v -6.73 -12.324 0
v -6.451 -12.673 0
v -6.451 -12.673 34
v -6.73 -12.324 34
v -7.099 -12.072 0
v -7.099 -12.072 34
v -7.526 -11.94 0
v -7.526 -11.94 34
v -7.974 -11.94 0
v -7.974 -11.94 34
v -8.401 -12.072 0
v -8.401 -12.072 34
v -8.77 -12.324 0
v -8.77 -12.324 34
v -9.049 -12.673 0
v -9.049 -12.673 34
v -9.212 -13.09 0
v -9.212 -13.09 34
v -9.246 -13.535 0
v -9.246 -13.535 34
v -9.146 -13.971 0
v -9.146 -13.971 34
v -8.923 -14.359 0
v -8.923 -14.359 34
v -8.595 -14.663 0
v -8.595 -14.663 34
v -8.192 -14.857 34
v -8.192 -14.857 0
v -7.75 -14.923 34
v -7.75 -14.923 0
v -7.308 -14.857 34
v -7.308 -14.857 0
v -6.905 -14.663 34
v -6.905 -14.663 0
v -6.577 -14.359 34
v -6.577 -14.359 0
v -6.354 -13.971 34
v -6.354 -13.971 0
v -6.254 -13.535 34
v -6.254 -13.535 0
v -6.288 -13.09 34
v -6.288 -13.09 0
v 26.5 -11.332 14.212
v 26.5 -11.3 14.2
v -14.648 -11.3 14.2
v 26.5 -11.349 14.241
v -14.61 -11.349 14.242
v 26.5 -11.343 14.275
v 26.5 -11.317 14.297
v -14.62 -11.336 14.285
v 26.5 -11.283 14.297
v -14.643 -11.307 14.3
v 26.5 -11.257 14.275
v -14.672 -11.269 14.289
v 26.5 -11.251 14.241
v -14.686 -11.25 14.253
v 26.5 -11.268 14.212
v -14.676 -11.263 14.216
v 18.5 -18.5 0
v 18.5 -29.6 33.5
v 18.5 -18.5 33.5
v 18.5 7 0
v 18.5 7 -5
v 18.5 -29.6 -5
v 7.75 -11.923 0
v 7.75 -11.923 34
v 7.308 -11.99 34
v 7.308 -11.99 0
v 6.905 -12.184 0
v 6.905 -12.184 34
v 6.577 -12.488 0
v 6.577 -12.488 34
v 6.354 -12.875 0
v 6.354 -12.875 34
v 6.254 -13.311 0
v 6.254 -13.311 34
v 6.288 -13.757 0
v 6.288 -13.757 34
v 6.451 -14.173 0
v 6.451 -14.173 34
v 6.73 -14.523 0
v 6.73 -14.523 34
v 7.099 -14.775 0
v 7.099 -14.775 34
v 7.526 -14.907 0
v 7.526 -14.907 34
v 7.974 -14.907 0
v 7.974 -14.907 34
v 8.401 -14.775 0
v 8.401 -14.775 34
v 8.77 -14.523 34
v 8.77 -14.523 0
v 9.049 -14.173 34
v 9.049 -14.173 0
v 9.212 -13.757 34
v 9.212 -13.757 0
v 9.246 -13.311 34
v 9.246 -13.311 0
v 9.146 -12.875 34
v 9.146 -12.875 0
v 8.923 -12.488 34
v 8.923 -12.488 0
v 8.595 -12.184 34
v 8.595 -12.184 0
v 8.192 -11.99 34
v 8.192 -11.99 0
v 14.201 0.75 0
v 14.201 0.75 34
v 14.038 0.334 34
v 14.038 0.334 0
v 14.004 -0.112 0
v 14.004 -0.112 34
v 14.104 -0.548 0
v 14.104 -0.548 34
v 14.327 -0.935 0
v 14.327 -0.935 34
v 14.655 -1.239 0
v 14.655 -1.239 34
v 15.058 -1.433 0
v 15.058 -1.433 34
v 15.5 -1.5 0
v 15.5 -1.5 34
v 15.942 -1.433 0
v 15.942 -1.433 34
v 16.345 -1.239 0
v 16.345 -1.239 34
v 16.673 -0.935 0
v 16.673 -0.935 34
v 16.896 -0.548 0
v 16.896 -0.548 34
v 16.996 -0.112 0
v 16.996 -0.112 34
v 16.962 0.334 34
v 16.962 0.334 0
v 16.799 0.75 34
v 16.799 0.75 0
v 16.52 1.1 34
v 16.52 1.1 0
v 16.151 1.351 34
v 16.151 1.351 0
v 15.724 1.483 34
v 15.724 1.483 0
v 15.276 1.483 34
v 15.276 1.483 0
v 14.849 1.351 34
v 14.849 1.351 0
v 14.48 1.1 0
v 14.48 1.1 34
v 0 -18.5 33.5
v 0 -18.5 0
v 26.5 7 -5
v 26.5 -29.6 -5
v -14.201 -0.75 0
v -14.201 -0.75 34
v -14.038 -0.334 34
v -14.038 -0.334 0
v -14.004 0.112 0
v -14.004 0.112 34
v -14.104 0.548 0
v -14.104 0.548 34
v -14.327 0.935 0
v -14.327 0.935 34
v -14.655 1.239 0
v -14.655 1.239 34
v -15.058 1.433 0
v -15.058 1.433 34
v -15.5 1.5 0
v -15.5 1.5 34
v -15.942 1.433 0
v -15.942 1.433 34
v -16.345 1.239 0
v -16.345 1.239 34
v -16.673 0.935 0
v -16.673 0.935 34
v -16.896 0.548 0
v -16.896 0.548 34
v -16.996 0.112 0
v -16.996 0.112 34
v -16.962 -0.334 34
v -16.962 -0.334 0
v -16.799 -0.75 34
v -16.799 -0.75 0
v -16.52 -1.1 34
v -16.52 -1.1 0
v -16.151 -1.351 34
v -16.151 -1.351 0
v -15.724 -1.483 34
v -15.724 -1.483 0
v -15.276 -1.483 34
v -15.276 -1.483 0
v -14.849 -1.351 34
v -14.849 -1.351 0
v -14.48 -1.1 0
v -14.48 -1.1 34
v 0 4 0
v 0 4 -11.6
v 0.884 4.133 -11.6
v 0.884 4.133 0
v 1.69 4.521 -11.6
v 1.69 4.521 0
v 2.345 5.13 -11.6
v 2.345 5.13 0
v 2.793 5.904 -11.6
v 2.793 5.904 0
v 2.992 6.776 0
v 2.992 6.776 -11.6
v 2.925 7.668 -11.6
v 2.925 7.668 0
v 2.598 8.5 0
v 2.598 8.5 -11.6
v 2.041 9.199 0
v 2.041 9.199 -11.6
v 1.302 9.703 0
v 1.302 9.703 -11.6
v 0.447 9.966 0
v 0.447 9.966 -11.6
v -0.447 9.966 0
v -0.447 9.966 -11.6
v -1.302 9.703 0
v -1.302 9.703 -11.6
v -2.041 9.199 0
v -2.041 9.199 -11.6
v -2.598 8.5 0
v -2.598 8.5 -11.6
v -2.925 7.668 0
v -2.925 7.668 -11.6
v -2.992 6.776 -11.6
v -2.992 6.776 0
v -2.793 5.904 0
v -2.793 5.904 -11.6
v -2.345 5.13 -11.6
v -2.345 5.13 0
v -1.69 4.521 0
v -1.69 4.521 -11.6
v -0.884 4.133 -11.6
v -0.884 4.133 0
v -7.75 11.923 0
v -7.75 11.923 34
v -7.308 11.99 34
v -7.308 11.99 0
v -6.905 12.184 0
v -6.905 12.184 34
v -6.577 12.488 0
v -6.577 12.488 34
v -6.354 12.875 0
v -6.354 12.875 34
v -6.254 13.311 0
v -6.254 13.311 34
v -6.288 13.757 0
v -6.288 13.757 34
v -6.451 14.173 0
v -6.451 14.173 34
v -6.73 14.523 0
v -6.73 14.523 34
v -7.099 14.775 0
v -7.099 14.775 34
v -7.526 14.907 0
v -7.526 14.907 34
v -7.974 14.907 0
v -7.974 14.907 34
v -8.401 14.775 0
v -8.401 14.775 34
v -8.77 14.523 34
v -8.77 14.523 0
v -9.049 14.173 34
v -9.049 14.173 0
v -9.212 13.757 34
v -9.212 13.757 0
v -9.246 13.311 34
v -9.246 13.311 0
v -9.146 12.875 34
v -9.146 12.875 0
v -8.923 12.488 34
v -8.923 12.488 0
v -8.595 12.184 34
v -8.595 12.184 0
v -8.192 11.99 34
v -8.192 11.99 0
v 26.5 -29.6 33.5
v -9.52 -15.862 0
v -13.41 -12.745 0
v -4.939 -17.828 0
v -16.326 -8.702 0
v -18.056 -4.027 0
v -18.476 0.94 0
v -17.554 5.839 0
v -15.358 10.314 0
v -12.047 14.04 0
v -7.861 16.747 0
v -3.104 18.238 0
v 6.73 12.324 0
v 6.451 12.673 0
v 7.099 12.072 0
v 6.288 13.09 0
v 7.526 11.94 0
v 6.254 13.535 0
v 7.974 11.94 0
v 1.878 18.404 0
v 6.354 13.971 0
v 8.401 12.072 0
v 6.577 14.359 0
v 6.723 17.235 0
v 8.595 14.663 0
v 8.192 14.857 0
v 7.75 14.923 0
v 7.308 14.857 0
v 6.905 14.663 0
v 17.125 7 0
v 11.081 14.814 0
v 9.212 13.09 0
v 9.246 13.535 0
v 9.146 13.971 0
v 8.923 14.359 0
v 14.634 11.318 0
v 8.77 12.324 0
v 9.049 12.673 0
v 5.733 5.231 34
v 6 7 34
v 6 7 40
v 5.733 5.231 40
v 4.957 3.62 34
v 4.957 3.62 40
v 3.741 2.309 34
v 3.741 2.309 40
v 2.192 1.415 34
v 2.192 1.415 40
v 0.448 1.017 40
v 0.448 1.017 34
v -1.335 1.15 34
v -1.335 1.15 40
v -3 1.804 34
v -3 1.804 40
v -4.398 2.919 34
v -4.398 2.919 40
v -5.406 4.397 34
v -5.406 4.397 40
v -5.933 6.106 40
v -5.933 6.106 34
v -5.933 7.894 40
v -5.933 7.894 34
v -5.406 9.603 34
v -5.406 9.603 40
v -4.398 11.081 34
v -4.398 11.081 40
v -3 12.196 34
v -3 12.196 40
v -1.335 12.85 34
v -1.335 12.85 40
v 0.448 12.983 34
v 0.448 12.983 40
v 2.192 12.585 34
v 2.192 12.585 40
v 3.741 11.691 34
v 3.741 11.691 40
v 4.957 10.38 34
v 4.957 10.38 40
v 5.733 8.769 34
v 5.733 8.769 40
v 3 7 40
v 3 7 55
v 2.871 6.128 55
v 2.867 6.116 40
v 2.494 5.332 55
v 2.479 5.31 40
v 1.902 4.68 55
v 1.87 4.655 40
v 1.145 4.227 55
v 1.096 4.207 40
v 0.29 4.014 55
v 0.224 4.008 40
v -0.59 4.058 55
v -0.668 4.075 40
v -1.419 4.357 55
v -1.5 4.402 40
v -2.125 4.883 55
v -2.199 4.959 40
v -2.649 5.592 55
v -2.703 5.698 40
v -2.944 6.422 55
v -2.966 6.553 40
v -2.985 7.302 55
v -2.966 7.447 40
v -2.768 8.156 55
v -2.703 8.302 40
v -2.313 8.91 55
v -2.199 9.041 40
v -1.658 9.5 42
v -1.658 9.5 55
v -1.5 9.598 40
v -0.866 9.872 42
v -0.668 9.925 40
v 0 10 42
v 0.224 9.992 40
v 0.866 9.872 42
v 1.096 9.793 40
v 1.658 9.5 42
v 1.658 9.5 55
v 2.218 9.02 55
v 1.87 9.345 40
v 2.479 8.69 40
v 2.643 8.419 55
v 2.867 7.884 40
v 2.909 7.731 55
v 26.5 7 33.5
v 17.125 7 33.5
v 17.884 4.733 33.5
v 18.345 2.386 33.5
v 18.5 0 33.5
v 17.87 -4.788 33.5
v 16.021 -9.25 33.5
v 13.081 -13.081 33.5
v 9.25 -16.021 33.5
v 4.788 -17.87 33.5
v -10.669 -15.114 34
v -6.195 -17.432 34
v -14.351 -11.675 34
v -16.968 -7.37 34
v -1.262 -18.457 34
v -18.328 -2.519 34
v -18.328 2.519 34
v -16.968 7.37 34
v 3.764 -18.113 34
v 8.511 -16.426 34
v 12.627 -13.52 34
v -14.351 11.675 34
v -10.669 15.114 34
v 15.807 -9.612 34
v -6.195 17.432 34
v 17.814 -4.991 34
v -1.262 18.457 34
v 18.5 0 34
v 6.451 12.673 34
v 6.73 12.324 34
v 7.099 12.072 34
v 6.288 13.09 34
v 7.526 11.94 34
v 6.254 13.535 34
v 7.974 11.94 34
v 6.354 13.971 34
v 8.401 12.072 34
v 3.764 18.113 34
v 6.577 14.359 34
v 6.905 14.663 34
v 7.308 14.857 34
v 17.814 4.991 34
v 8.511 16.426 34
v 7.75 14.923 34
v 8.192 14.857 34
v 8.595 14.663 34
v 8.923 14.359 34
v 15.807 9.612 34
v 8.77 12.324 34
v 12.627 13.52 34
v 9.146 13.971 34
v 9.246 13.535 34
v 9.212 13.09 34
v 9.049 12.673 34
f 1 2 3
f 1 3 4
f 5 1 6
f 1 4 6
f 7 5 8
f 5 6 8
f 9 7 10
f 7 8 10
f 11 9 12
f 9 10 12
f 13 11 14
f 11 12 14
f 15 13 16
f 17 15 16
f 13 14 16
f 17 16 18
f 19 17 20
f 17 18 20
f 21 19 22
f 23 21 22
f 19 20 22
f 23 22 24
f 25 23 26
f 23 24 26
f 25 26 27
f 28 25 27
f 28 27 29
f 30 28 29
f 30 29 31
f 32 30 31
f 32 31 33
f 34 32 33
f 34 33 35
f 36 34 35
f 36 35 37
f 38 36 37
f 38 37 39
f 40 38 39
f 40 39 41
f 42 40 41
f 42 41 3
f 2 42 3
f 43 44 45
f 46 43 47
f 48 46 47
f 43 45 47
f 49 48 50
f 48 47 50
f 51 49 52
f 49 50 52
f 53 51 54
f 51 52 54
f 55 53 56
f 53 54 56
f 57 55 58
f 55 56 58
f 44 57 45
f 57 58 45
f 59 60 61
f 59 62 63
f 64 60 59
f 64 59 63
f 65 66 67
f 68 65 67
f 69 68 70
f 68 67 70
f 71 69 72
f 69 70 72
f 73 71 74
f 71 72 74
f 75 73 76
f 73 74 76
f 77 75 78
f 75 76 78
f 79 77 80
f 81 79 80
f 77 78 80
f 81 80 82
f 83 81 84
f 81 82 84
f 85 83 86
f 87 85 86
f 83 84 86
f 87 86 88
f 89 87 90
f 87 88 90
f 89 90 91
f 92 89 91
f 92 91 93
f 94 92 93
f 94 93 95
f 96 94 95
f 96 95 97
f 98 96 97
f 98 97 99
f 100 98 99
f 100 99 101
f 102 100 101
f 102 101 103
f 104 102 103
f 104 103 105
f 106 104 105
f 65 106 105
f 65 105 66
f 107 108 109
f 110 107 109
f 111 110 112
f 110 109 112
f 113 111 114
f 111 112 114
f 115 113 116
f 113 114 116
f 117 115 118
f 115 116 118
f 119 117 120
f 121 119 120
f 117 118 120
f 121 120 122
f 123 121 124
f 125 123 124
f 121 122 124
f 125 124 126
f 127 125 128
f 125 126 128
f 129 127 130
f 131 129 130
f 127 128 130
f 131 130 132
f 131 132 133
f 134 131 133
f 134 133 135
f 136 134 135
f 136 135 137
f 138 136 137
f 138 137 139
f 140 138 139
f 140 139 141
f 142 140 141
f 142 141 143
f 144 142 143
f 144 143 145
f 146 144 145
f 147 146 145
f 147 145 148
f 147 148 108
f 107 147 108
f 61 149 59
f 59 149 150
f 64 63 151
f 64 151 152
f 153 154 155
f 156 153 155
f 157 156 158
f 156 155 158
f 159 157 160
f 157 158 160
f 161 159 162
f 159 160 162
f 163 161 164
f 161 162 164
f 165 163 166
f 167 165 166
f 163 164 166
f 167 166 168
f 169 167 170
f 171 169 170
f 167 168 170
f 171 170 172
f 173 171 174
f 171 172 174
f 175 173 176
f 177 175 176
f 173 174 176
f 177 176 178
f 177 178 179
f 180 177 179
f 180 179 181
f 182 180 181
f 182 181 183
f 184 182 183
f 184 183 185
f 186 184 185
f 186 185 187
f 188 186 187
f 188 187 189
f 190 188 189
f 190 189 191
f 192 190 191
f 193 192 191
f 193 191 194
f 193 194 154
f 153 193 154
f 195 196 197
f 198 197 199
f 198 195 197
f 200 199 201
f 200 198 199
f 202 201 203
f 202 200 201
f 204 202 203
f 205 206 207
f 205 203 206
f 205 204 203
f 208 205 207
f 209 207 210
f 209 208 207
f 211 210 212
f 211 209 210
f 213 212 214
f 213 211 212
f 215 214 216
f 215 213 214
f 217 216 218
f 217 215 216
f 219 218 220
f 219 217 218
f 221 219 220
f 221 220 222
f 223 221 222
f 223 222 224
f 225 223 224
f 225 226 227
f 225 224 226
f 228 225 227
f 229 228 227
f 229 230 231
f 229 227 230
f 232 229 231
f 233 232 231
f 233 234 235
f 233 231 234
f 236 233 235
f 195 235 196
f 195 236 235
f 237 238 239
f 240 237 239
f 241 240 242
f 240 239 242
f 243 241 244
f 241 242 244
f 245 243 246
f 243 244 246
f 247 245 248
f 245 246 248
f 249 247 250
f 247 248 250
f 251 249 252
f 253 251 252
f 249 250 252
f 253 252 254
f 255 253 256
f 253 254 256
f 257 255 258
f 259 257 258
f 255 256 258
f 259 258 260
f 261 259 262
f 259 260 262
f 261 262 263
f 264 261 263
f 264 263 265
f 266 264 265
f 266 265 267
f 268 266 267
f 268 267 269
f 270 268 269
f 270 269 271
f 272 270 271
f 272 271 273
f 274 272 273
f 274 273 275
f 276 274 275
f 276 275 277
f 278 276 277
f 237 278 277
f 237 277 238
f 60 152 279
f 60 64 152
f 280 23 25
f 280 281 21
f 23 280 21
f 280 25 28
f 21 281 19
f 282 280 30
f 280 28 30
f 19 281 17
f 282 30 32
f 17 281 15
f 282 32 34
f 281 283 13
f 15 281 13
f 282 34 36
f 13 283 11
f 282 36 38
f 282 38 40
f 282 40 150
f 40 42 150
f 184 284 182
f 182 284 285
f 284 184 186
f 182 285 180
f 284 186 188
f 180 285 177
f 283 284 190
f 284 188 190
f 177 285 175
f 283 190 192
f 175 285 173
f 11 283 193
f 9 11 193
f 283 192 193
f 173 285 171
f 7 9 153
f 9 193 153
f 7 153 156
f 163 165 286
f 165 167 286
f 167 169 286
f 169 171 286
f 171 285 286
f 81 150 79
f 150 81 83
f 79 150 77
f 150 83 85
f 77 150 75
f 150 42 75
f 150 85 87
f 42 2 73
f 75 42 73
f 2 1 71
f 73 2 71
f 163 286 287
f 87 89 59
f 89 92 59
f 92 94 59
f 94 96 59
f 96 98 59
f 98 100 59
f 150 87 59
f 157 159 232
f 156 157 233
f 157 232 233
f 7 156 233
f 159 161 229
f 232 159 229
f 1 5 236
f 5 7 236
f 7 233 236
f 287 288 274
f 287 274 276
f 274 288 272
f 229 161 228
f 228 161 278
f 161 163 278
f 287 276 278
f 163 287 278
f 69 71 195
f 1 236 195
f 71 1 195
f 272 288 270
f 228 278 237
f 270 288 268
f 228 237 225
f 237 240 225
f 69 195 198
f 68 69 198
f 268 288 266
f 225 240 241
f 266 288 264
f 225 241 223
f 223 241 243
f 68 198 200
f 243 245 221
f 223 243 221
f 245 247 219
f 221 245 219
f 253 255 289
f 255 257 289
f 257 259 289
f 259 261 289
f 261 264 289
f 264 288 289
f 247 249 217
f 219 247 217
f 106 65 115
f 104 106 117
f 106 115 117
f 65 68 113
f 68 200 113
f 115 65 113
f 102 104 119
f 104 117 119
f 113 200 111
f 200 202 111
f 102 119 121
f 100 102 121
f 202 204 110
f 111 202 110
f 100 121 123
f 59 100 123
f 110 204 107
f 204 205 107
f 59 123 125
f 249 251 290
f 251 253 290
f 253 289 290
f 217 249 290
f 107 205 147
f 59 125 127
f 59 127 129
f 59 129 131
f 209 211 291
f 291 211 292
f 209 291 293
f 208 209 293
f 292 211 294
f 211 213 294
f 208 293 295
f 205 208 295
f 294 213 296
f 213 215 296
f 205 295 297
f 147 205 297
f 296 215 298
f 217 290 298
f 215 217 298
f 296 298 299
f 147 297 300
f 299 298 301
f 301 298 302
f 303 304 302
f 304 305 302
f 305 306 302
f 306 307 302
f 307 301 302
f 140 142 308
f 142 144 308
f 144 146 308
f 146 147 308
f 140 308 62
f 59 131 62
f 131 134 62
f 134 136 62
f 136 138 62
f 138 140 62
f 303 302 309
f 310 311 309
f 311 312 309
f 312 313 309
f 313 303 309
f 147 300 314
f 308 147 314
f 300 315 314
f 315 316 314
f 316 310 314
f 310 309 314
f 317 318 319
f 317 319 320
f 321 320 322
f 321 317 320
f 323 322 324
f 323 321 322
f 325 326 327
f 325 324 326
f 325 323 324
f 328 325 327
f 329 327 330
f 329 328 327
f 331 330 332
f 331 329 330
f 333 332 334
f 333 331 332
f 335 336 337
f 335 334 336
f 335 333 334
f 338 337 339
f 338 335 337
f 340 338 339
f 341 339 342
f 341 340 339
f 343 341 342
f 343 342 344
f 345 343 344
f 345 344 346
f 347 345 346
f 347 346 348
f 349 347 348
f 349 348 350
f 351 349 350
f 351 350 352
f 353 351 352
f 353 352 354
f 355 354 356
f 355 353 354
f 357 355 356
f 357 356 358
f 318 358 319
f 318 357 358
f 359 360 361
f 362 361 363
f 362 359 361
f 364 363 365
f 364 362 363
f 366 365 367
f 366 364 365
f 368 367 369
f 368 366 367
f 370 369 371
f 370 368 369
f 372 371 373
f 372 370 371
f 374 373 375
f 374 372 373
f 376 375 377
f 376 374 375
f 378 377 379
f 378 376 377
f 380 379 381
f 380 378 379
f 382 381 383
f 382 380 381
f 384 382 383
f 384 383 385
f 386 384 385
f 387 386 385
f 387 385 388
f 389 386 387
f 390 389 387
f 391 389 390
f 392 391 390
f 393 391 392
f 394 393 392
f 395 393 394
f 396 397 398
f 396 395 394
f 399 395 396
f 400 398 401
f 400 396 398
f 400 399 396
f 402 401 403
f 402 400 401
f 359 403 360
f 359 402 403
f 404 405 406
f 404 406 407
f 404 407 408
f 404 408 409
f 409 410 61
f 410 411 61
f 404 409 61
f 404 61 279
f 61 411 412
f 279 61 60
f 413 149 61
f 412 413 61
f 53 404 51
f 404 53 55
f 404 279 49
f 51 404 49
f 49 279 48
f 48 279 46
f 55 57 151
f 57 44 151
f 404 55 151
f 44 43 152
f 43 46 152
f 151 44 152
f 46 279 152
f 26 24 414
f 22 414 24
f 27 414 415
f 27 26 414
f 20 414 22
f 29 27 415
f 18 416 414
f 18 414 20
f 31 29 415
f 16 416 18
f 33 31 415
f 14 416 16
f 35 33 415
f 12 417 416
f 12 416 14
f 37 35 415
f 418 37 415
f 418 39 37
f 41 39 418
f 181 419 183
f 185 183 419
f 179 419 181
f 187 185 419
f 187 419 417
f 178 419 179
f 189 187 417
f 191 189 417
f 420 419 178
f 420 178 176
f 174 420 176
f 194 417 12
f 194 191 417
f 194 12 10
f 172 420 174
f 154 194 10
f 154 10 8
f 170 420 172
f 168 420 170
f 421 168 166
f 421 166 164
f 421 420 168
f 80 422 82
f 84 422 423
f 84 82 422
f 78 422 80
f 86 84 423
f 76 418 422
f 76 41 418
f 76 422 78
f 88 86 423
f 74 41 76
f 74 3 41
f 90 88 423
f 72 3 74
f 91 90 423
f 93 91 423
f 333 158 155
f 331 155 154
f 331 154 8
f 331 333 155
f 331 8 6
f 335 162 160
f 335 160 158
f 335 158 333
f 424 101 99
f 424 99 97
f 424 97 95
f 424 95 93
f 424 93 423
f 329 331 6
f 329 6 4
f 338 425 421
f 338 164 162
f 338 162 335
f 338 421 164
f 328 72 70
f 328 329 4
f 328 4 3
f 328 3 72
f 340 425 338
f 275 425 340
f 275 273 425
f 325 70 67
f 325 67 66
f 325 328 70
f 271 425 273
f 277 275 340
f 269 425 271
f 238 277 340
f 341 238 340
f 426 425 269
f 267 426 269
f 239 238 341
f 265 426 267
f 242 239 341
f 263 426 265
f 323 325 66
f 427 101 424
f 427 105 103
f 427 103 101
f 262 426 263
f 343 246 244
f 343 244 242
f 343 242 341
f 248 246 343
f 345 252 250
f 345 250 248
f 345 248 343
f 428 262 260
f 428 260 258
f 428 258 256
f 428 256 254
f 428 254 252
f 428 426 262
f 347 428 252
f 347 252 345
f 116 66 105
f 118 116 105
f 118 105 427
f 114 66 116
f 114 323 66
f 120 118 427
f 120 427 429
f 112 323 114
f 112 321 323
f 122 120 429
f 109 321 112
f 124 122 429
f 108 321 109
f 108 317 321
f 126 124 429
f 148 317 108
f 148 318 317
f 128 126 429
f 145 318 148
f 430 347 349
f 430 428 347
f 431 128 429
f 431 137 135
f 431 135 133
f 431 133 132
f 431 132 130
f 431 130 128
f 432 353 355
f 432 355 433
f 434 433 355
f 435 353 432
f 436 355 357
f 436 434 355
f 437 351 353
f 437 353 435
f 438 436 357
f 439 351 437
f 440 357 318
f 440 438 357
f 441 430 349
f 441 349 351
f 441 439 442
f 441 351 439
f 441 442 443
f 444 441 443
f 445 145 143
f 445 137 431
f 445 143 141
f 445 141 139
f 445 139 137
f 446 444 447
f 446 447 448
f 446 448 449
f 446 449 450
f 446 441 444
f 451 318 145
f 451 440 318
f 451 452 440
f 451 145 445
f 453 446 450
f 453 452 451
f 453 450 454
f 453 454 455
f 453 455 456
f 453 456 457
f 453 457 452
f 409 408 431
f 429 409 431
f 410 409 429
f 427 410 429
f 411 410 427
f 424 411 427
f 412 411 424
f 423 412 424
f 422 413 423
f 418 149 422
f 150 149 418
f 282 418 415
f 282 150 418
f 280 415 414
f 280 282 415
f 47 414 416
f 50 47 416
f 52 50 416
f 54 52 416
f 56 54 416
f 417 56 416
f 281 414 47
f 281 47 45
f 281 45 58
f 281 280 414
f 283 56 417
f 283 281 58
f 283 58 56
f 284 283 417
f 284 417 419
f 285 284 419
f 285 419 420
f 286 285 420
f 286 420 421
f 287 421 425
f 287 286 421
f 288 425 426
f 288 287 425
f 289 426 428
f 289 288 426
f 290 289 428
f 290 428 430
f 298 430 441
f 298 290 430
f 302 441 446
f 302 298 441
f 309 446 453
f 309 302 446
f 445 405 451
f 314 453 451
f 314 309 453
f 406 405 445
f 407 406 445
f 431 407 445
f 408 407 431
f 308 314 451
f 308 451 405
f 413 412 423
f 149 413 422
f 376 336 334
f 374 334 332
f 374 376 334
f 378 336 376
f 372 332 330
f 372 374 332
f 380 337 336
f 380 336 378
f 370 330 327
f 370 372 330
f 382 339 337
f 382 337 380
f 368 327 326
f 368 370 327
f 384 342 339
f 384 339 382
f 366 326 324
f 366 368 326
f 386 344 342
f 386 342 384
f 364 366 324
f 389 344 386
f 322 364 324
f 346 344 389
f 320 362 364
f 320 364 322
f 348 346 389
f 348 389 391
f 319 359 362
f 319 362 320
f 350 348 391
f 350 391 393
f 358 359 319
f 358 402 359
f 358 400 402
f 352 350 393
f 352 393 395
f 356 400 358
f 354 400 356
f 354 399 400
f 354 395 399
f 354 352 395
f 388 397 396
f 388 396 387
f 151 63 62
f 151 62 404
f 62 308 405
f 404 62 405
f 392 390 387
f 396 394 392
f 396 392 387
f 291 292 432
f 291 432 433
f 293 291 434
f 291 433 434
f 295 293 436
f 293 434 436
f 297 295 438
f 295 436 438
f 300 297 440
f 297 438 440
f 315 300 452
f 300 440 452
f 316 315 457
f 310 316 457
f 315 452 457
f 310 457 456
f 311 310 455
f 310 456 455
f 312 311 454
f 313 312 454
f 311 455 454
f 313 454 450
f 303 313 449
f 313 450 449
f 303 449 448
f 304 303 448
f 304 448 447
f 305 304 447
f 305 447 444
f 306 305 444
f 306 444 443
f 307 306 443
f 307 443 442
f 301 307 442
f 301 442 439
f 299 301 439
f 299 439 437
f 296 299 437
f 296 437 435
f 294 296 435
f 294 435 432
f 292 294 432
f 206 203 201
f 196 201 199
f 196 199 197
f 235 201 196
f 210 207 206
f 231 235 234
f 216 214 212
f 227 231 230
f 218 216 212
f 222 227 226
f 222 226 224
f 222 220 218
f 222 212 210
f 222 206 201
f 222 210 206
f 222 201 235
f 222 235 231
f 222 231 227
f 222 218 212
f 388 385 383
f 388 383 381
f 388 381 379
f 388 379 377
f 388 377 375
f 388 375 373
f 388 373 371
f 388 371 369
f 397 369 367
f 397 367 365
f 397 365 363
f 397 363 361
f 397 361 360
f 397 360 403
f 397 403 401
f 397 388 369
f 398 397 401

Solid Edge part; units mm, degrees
sketch "Sketch1" plane through (0, 0, 0) normal (0, 0, 1) x (1, 0, 0)
  circle A0 centre (0, 0) radius 18.5
  dimension "D1" = 37
extrude "Protrusion1" add sketch "Sketch1" along normal blind 34
sketch "Sketch2" plane through (0, 0, 34) normal (0, 0, 1) x (1, 0, 0)
  circle A0 centre (0, 7) radius 6
  dimension "D1" = 7
extrude "ExtrudedProtrusion_2" add sketch "Sketch2" along normal blind 6
sketch "Sketch3" plane through (0, 7, 40) normal (0, 0, 1) x (1, 0, 0)
  circle A0 centre (0, 0) radius 3
extrude "ExtrudedProtrusion_3" add sketch "Sketch3" along normal blind 15
sketch "Sketch4" plane through (0, 7, 55) normal (0, 0, 1) x (1, 0, 0)
  line L0 (-1.6583, 2.5) -> (1.6583, 2.5)
  dimension "D1" = 2.5
extrude "ExtrudedCutout_1" cut sketch "Sketch4" against normal blind 13 material side at (0, 9.55, 55)
sketch "Sketch5" plane through (0, 0, 0) normal (0, 0, -1) x (0, -1, 0)
  circle A0 centre (-7, 0) radius 3
extrude "ExtrudedProtrusion_4" add sketch "Sketch5" along normal blind 11.6
sketch "Sketch6" plane through (0, 0, 0) normal (1, 0, 0) x (0, 1, 0)
  line L0 (-18.5, 0) -> (7, 0)
  line L1 (7, 0) -> (7, 33.5)
  line L2 (7, 33.5) -> (-18.5, 33.5)
  line L3 (-18.5, 33.5) -> (-18.5, 0)
  dimension "D1" = 33.5
  dimension "D2" = 0.5
  dimension "D3" = 7
  dimension "D4" = 18.5
extrude "ExtrudedProtrusion_5" add sketch "Sketch6" along normal blind 18.5
sketch "Sketch7" plane through (18.5, -5.75, 16.75) normal (1, 0, 0) x (0, 0, -1)
  line L0 (-16.75, 12.75) -> (21.75, 12.75)
  line L1 (21.75, 12.75) -> (21.75, -23.85)
  line L2 (21.75, -23.85) -> (-16.75, -23.85)
  line L3 (-16.75, -23.85) -> (-16.75, 12.75)
  dimension "D1" = 29.6
  dimension "D2" = 5
extrude "ExtrudedProtrusion_6" add sketch "Sketch7" along normal blind 8
hole "Hole_1" at (-7.75, 13.4234, 34) direction (0, 0, -1) diameter 3 end through all
pattern_circular "Pattern1" count 6 over 360 about axis through (0, 0, 34) along (0, 0, -1) of "Hole_1"
hole "Hole_7" at (26.5, -11.3, 14.25) direction (-1, 0, 0) diameter 0.1 depth 140
